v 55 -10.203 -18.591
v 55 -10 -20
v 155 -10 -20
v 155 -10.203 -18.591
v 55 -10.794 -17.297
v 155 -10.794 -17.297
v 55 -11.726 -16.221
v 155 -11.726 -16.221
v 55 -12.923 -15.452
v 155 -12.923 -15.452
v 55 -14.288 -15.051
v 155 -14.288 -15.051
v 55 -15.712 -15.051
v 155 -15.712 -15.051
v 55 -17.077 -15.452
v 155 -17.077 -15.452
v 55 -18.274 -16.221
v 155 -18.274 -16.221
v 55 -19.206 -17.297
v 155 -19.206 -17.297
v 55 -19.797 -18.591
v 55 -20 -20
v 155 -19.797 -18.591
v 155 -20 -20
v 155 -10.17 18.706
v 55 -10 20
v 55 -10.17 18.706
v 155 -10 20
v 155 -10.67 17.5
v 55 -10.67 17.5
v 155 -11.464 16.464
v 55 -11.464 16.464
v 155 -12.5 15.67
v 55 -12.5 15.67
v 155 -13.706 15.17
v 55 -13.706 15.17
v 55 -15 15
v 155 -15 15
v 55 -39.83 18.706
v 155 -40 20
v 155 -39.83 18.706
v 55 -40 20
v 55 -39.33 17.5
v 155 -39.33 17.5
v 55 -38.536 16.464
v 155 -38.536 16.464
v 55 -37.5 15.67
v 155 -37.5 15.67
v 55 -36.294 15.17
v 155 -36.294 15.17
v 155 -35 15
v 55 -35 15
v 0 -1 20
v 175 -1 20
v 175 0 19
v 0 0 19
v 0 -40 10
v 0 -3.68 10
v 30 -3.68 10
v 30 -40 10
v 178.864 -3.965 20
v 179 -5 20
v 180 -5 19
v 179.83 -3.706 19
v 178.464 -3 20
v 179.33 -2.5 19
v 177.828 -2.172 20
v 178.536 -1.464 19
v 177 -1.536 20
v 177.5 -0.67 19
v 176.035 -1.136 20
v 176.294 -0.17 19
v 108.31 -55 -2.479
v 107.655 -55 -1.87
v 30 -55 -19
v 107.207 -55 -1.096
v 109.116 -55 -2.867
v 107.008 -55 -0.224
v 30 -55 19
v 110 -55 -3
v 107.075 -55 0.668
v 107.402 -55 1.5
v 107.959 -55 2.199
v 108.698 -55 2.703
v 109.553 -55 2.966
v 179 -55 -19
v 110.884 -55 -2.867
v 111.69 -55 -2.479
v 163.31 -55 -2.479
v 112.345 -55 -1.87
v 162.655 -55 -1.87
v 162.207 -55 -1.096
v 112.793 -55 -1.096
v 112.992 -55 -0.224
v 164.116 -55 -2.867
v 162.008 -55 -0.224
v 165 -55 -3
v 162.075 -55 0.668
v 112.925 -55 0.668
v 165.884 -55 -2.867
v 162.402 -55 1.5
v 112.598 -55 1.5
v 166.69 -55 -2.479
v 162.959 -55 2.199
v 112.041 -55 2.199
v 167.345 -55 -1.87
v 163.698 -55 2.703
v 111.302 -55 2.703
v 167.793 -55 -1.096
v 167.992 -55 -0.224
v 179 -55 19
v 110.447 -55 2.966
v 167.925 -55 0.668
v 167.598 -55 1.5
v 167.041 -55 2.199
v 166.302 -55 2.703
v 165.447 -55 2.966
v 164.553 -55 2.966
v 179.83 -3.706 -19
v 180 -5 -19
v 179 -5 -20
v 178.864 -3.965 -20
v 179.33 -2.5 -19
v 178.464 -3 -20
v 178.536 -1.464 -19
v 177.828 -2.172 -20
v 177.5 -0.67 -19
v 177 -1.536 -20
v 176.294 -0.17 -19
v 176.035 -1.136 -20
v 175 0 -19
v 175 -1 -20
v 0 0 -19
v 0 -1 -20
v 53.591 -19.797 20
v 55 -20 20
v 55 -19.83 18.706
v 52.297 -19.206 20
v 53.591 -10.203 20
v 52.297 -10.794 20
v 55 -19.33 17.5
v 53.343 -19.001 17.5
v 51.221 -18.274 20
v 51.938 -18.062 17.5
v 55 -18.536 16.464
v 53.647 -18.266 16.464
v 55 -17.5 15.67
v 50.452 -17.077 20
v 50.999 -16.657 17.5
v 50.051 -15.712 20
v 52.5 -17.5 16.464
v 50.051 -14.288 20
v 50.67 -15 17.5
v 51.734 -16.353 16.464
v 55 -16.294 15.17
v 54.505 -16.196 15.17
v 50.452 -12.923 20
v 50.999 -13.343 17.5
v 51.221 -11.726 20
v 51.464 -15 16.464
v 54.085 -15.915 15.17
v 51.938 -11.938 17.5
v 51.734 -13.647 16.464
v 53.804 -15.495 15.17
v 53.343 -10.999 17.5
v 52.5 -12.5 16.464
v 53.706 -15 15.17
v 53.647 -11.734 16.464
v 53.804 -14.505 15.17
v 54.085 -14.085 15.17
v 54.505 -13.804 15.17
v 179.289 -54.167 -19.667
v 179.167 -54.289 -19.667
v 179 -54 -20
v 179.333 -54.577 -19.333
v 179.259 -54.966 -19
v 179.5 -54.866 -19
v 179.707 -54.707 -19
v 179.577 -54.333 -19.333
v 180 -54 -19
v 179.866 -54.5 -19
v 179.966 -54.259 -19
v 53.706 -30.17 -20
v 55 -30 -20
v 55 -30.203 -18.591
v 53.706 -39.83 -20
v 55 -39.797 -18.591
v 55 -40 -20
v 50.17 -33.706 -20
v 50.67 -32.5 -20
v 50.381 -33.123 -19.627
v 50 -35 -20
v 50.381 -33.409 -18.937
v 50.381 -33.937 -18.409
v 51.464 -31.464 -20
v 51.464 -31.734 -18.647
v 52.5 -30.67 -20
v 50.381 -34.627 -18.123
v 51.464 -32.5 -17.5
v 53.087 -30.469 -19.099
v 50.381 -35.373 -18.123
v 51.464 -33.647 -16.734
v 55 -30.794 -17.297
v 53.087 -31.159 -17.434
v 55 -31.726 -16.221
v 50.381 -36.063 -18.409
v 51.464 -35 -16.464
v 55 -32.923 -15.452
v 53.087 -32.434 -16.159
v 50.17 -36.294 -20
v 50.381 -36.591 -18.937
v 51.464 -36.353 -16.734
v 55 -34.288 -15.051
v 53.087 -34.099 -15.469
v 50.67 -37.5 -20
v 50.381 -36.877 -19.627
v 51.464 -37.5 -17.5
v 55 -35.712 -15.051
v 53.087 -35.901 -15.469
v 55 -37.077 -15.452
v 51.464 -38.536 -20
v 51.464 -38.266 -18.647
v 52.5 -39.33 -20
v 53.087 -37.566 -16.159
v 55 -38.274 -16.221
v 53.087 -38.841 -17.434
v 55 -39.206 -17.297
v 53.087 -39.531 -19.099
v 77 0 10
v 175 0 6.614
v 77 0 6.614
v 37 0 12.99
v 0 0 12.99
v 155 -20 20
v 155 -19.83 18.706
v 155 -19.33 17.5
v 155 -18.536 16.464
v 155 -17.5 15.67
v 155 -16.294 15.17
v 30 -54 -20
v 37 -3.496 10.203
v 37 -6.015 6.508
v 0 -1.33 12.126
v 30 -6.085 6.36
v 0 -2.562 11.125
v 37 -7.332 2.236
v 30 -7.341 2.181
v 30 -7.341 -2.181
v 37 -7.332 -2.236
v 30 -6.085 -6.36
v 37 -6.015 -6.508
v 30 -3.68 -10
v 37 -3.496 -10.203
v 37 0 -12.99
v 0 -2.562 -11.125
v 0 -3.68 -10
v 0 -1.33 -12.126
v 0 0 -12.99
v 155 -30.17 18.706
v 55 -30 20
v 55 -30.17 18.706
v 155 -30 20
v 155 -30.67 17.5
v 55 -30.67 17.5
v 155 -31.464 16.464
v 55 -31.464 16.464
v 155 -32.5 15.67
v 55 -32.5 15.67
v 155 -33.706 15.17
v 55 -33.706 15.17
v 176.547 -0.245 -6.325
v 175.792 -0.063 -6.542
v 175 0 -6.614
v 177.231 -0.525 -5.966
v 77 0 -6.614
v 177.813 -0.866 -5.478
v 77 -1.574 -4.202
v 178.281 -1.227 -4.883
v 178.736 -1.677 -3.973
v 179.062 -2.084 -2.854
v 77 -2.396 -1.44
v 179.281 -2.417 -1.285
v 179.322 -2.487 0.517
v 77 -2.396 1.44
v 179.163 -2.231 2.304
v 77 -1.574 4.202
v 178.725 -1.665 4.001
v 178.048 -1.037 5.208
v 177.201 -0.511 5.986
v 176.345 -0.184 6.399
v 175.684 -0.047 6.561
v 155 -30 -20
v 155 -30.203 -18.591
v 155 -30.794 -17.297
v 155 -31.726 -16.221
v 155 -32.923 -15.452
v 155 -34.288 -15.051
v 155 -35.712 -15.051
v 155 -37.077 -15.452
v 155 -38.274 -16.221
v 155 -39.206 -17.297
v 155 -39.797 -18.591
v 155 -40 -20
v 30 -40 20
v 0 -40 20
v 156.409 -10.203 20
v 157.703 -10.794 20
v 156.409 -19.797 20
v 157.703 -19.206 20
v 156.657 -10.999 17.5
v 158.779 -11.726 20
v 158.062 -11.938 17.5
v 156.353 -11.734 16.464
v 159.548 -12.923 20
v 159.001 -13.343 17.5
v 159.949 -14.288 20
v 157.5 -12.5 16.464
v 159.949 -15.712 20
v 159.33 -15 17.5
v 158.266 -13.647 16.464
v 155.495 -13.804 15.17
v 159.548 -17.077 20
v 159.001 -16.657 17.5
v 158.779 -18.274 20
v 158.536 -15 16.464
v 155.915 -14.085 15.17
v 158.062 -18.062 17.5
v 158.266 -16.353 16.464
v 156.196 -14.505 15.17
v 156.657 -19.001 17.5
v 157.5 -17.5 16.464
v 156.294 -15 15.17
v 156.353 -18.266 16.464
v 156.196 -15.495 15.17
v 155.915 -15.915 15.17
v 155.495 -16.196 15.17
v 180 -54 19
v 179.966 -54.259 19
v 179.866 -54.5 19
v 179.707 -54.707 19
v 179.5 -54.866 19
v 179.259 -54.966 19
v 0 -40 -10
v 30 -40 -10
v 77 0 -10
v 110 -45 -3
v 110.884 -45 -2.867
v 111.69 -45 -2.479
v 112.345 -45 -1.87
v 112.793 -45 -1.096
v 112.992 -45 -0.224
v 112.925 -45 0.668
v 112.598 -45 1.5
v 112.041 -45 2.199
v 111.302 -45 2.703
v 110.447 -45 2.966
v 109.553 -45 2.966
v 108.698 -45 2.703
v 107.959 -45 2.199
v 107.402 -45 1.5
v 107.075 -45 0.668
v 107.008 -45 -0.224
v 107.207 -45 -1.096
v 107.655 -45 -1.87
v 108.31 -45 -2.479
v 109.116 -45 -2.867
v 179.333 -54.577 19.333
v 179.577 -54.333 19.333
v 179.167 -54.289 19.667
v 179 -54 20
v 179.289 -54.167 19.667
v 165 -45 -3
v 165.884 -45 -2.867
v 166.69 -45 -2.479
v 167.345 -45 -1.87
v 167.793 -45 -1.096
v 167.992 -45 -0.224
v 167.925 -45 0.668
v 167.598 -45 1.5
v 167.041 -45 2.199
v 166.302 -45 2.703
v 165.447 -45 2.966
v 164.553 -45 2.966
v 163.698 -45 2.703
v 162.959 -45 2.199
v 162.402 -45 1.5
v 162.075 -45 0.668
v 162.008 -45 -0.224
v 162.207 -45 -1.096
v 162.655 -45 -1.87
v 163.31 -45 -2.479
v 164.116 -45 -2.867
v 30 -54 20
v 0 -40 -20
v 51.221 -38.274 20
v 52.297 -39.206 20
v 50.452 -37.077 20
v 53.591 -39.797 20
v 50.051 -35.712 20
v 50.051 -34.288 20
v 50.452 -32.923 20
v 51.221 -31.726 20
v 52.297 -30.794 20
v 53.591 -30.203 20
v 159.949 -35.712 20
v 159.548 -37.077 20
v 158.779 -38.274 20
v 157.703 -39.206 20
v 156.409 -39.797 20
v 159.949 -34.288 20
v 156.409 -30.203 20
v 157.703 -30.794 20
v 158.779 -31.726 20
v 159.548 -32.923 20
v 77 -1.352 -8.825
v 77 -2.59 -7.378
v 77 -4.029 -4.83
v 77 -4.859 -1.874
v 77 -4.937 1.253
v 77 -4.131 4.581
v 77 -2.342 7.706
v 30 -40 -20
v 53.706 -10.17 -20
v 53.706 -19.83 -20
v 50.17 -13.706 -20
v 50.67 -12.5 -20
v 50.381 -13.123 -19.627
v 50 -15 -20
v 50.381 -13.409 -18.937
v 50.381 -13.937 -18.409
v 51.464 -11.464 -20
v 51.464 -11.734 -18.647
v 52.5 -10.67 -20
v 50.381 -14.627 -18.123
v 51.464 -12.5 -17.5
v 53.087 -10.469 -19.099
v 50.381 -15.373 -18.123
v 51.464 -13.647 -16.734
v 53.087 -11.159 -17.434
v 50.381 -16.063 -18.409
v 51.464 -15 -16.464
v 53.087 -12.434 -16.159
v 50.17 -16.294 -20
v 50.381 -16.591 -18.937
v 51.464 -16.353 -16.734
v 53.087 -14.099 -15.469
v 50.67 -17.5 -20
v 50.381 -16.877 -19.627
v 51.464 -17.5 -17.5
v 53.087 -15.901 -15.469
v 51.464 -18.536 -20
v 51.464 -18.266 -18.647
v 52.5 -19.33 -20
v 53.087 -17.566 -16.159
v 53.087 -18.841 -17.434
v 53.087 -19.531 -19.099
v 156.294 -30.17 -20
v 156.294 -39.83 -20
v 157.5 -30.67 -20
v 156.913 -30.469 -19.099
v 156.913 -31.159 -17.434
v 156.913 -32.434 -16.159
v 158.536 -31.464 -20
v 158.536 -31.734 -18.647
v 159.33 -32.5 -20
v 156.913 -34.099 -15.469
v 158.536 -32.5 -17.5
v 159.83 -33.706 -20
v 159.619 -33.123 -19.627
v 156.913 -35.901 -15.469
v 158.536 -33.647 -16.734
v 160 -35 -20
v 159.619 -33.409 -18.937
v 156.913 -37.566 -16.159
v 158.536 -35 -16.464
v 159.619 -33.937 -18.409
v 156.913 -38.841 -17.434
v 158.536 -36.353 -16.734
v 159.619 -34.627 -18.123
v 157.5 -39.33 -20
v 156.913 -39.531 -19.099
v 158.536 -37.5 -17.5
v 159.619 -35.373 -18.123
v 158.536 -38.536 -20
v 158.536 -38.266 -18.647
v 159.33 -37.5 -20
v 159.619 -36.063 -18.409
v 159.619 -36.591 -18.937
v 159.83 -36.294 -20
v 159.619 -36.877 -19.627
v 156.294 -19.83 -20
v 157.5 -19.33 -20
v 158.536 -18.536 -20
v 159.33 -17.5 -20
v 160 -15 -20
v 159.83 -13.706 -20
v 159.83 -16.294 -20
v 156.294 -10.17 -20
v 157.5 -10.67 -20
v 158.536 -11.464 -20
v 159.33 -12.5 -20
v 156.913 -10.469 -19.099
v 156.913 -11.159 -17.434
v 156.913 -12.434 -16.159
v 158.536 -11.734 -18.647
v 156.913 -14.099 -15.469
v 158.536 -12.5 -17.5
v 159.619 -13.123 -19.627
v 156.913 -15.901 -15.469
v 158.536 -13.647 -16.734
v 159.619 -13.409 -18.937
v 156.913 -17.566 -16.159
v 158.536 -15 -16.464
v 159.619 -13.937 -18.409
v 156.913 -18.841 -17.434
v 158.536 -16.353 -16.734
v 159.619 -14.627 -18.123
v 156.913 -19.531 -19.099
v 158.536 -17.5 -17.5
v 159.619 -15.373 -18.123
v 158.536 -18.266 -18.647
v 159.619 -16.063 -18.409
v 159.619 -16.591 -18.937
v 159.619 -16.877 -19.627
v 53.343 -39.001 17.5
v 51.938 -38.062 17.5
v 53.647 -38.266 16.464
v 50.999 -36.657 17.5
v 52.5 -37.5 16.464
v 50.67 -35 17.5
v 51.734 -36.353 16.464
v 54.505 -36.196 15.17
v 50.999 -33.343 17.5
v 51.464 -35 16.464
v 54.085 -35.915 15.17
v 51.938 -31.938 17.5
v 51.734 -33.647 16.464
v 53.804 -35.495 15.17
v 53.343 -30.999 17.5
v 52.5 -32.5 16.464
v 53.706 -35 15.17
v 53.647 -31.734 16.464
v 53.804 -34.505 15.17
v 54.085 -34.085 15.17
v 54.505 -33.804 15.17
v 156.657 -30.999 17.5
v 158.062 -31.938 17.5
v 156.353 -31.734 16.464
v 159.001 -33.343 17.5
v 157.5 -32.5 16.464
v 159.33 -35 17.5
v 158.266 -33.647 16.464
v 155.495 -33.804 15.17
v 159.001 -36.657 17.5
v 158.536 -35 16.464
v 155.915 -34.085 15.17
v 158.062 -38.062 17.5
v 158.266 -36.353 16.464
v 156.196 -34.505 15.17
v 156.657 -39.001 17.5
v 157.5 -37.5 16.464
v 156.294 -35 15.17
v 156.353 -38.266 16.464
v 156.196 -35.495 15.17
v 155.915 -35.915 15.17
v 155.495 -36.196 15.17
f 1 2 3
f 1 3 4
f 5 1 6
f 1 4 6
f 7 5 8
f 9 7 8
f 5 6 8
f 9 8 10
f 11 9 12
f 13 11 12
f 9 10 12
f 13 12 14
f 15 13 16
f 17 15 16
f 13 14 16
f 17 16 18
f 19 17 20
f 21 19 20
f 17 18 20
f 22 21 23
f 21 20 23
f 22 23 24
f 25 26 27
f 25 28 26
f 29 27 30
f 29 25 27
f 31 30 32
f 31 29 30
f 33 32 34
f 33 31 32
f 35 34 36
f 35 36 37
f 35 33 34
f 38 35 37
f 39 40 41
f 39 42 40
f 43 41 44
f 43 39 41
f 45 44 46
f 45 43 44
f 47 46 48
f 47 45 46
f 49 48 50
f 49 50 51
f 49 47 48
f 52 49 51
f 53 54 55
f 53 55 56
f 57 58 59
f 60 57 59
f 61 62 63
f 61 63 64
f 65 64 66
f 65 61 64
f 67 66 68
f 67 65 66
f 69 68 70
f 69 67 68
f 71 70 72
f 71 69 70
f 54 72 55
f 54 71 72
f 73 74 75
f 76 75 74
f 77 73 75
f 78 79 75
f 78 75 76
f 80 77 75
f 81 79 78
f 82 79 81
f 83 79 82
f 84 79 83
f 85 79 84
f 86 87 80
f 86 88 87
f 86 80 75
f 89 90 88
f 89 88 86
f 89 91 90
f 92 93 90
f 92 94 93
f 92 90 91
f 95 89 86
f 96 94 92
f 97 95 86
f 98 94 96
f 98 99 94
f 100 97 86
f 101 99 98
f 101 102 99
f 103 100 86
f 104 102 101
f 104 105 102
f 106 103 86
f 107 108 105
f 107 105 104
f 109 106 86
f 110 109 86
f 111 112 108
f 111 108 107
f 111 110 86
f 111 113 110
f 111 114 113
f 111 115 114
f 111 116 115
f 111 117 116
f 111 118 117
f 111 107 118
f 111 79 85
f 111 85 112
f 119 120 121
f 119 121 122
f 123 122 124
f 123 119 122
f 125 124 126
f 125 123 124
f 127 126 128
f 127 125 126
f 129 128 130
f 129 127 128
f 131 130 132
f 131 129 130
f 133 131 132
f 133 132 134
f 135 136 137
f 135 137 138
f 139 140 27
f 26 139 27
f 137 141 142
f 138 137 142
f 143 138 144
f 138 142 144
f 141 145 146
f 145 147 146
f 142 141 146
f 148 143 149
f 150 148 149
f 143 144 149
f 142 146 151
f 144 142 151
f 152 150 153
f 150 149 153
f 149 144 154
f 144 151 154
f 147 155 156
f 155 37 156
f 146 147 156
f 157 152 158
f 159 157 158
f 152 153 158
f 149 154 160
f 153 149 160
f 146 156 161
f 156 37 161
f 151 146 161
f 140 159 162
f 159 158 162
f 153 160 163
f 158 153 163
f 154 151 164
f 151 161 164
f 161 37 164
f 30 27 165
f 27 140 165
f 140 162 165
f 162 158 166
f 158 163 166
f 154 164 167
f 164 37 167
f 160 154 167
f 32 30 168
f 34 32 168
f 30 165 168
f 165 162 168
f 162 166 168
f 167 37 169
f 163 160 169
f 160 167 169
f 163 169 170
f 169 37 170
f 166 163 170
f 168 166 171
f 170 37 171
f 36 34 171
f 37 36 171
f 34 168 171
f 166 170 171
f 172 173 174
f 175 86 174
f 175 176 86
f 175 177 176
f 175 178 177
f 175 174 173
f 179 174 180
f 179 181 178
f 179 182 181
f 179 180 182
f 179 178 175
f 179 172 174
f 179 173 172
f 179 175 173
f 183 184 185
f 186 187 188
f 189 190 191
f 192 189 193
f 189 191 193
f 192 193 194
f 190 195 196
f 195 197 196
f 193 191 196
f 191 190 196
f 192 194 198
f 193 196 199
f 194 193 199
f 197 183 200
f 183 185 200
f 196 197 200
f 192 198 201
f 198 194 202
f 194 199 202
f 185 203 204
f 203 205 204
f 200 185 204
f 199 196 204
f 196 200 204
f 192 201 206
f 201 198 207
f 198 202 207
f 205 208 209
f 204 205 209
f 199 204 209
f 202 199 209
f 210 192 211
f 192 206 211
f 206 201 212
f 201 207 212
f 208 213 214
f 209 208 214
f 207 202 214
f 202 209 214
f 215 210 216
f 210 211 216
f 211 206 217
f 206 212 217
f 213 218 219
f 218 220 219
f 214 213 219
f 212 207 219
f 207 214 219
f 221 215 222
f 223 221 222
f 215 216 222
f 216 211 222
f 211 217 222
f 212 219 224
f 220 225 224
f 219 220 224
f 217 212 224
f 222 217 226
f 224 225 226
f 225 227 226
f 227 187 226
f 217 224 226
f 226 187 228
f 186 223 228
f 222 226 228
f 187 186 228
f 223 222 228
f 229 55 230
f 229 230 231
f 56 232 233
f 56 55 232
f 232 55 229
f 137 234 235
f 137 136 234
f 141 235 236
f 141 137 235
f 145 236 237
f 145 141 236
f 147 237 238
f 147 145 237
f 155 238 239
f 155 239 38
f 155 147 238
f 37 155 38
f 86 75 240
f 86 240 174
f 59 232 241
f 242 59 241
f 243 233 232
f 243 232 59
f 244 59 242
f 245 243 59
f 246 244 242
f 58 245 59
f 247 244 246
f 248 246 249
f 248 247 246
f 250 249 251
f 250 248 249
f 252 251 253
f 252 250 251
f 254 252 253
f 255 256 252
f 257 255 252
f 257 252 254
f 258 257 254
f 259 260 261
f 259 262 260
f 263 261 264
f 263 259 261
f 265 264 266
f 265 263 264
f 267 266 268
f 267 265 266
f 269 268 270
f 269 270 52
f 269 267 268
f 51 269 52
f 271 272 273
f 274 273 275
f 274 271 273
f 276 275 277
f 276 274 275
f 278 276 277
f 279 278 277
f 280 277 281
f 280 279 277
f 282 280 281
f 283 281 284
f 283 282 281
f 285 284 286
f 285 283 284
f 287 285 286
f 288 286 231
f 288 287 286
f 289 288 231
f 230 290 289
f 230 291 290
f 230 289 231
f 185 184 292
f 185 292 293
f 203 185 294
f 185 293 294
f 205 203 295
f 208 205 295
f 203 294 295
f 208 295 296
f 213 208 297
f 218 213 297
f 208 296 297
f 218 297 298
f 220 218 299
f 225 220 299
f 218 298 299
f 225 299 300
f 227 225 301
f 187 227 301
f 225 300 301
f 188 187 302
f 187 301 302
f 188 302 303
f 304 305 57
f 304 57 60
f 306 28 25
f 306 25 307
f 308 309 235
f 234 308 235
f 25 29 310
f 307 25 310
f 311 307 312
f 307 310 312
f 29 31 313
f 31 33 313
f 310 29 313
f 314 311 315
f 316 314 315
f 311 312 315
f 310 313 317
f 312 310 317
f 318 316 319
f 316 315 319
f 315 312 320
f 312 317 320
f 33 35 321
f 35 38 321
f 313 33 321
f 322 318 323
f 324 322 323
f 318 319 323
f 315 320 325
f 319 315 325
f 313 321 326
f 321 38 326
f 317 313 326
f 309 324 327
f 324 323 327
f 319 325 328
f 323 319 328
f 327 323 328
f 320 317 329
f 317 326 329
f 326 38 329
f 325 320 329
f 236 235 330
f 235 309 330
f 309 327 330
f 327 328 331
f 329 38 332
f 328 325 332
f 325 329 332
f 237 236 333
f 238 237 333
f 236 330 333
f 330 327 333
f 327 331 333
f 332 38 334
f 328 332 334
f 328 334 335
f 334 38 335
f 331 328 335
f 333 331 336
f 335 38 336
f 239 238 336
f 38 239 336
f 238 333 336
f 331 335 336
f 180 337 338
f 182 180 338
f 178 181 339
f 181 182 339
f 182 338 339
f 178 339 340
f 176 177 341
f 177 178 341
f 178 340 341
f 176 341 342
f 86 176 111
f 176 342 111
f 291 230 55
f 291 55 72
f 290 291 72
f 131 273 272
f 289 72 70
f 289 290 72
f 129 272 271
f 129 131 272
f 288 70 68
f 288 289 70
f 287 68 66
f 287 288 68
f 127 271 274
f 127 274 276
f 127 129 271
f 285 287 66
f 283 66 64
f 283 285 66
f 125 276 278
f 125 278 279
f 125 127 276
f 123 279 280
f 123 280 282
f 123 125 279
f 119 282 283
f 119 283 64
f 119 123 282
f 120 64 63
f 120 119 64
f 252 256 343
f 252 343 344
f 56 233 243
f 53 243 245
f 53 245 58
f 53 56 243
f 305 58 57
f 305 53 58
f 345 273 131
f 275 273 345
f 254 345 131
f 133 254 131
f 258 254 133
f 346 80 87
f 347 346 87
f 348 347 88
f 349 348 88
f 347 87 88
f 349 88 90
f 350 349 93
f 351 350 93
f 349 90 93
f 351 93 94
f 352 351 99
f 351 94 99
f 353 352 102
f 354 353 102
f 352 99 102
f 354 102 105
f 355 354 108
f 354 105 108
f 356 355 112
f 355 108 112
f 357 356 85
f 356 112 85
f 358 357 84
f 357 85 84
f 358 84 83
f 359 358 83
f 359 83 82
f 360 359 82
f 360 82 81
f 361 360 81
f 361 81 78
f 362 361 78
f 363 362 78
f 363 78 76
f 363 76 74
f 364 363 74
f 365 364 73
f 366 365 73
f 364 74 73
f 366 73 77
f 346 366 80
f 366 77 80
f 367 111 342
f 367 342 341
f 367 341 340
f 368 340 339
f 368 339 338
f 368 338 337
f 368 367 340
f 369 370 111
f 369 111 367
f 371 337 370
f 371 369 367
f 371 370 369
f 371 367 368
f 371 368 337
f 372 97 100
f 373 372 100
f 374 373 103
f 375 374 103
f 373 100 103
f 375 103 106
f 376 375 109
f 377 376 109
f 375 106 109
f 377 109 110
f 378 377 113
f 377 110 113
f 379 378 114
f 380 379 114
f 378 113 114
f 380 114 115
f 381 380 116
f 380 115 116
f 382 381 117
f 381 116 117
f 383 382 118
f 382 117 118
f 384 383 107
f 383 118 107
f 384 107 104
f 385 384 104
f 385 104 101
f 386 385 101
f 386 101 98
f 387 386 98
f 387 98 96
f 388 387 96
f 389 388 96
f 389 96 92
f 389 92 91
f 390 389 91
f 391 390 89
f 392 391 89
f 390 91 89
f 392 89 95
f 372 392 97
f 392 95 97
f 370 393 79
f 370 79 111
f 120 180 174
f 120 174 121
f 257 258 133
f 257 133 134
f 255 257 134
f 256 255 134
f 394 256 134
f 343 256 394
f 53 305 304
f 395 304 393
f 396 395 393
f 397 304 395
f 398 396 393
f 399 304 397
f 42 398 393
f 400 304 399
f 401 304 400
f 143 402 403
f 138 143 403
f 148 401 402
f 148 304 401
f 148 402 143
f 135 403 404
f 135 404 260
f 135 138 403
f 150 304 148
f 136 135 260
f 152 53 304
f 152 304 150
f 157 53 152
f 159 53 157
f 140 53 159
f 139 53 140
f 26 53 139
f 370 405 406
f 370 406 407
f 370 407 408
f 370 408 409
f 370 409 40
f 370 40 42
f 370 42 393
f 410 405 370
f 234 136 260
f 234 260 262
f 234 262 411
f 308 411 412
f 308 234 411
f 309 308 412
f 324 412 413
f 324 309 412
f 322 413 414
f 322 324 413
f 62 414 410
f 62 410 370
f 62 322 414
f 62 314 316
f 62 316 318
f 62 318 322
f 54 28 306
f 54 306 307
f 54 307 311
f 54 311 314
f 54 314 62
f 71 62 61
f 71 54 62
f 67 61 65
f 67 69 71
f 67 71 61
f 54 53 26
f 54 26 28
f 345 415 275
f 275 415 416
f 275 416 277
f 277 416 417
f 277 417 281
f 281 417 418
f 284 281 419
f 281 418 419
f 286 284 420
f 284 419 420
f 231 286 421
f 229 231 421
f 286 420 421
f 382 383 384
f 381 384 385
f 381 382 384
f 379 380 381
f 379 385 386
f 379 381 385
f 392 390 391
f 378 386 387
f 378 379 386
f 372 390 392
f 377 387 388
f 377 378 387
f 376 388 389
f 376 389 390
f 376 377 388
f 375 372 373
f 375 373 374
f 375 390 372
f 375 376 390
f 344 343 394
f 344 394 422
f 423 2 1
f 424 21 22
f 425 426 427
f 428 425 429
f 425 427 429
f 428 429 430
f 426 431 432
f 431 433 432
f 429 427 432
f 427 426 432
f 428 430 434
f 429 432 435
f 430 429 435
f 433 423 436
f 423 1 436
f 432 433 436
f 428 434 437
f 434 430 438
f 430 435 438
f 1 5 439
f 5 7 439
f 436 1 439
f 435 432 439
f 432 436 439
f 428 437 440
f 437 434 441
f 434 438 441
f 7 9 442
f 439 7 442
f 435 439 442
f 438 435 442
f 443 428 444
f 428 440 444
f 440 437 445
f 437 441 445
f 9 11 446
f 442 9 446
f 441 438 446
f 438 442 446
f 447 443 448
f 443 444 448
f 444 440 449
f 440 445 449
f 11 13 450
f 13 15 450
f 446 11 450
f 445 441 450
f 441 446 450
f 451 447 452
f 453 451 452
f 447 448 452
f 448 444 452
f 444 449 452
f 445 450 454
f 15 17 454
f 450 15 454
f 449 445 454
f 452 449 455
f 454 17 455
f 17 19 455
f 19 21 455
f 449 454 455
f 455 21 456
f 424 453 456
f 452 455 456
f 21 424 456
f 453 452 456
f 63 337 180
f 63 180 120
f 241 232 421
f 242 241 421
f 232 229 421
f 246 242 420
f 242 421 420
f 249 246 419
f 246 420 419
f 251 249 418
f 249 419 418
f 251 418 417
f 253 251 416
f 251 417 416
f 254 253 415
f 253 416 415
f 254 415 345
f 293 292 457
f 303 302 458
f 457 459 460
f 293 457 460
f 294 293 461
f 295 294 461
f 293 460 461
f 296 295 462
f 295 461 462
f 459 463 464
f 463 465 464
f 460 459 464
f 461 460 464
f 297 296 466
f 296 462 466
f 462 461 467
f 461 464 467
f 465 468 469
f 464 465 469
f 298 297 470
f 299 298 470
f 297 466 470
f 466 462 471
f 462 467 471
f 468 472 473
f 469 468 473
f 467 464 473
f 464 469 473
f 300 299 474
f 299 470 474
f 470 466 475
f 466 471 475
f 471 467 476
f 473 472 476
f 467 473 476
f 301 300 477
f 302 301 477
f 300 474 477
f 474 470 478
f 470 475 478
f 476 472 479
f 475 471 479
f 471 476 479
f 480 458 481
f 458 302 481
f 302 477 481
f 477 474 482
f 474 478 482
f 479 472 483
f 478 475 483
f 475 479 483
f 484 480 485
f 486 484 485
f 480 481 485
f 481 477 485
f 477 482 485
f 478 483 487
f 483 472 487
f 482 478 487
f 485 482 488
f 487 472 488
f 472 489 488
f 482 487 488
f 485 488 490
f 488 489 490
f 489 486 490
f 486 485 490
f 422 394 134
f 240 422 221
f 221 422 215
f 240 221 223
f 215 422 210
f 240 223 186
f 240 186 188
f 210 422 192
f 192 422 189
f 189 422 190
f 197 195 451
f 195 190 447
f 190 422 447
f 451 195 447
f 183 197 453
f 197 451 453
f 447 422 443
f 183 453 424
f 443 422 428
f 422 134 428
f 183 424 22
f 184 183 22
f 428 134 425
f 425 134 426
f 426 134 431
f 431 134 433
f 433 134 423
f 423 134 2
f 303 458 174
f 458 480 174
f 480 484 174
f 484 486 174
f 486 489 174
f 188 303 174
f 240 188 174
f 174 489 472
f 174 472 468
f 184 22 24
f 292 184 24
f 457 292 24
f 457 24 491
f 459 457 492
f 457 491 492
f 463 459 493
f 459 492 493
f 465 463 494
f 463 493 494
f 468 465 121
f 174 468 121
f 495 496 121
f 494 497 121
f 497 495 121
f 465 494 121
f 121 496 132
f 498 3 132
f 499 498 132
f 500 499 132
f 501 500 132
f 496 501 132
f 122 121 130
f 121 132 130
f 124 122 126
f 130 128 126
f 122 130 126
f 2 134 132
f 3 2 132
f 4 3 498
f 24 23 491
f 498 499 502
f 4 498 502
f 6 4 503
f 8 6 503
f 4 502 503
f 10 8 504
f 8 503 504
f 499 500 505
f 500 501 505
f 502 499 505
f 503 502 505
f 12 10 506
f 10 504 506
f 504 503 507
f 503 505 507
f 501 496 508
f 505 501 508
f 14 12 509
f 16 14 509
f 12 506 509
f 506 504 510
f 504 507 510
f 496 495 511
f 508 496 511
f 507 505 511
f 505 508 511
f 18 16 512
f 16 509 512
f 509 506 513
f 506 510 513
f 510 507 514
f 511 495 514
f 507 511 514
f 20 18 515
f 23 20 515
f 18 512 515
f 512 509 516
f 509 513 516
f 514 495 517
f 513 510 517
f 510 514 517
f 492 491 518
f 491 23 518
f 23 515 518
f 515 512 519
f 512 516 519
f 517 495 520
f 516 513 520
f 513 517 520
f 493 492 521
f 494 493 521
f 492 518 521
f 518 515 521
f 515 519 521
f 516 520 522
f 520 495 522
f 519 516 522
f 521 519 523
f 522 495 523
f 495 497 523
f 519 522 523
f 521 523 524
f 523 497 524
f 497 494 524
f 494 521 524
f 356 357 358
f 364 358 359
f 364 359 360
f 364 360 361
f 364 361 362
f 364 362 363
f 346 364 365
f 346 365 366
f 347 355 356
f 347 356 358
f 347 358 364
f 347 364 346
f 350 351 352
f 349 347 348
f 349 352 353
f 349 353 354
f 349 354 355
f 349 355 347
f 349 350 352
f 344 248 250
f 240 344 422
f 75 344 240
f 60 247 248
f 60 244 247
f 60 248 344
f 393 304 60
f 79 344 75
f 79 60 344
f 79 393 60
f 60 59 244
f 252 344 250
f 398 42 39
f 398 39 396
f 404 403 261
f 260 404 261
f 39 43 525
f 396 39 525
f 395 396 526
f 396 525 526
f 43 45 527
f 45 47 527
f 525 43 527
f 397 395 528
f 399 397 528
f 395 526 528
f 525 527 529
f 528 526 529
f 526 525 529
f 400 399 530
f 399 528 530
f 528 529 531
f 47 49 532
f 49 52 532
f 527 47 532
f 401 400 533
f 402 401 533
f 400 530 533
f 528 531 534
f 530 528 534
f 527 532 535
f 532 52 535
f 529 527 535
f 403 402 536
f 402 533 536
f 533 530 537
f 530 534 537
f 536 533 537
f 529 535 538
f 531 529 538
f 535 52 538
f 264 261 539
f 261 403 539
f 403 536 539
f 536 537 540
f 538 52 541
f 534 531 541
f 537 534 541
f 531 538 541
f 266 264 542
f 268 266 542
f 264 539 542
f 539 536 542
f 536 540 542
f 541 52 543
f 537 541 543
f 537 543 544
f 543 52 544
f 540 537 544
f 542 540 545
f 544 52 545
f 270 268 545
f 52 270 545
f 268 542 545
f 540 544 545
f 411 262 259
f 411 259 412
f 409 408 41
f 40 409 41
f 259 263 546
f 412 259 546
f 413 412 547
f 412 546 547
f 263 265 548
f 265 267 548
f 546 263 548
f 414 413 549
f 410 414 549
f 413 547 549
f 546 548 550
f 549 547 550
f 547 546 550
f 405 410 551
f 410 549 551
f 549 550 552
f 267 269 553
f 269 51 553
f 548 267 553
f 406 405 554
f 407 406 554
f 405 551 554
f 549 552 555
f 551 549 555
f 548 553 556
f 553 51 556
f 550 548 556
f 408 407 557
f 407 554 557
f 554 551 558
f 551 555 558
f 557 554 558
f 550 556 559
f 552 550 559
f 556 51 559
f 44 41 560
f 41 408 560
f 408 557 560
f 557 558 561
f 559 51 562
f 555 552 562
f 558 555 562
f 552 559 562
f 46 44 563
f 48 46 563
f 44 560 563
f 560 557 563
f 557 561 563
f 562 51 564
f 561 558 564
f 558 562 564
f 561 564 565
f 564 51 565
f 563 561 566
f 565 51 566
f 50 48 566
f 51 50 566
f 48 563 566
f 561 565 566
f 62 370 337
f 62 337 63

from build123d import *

# Parameters (mm, degrees)
EXTRUDE_1_DEPTH                = 20
SKETCH_2_W                     = 30
SKETCH_2_H                     = 40
CUT_EXTRUDE_1_DEPTH            = 10
FILLET_1_R                     = 5
FILLET_2_R                     = 1
CUT_EXTRUDE_2_DEPTH            = 37
CUT_EXTRUDE_3_DEPTH            = 190.274932307
CHAMFER_1_SIZE                 = 1
CUT_EXTRUDE_4_DEPTH            = 5
FILLET_3_R                     = 5
PATTERN_LINEAR_7_COUNT         = 2
PATTERN_LINEAR_7_PITCH         = 20
FILLET_3_OF_PATTERN_LINEAR_7_R = 5
SKETCH_7_R                     = 3
CUT_EXTRUDE_5_DEPTH            = 10


# Read off the part's stored shape, not the designer's step: 대칭 복사4
with BuildPart() as part:
    # 스케치1 → 보스-돌출1 (new, symmetric)
    with BuildSketch(Plane.XY):
        Polygon((0, -40), (30, -40), (30, -55), (180, -55), (180, 0), (0, 0), align=None)
    extrude(amount=EXTRUDE_1_DEPTH, both=True)

    # 스케치2 → 컷-돌출1 (cut, symmetric)
    with BuildSketch(Plane.XY):
        with Locations((15, -20)):
            Rectangle(SKETCH_2_W, SKETCH_2_H)
    extrude(amount=CUT_EXTRUDE_1_DEPTH, both=True, mode=Mode.SUBTRACT)

    # 필렛1
    fillet_1_edges = [part.edges().sort_by_distance(p)[0] for p in [
        (180, 0, 0),
    ]]
    fillet(fillet_1_edges, radius=FILLET_1_R)

    # 필렛2
    fillet_2_edges = [part.edges().sort_by_distance(p)[0] for p in [
        (180, -55, 0),
    ]]
    fillet(fillet_2_edges, radius=FILLET_2_R)

    # 스케치3 → 컷-돌출2 (cut)
    with BuildSketch(Plane.ZY):
        with BuildLine():
            Line((-12.990381057, 0), (12.990381057, 0))
            ThreePointArc((12.990381057, 0), (0, -7.5), (-12.990381057, 0))
        make_face()
    extrude(amount=-CUT_EXTRUDE_2_DEPTH, mode=Mode.SUBTRACT)

    # 스케치4 → 컷-돌출3 (cut, through all)
    with BuildSketch(Plane(origin=(180, 0, 0), x_dir=(0, 0, -1), z_dir=(1, 0, 0))):
        with BuildLine():
            Line((-6.614378278, 0), (6.614378278, 0))
            ThreePointArc((6.614378278, 0), (0, -2.5), (-6.614378278, 0))
        make_face()
    extrude(amount=-CUT_EXTRUDE_3_DEPTH, mode=Mode.SUBTRACT)

    # 스케치6 for 컷-로프트1 → 컷-로프트1 section 0
    with BuildSketch(Plane.ZY.offset(-37)):
        with BuildLine():
            Line((-12.990381057, 0), (12.990381057, 0))
            # circular arc as an exact rational Bezier (weights 1, cos(half-angle), 1)
            Bezier((12.990381057, 0), (0, -22.5), (-12.990381057, 0), weights=[1, 0.5, 1])
        make_face()
    # 스케치5 for 컷-로프트1 → 컷-로프트1 section 1
    with BuildSketch(Plane.ZY.offset(-77)):
        with BuildLine():
            Line((-10, 0), (10, 0))
            Bezier((10, 0), (0, -13.333333333), (-10, 0), weights=[1, 0.6, 1])
        make_face()
    loft(mode=Mode.SUBTRACT)

    # 모따기1
    chamfer_1_edges = [part.edges().sort_by_distance(p)[0] for p in [
        (104.5, -55, 20),
        (87.5, 0, 20),
        (180, -29.5, -20),
        (178.535533906, -1.464466094, -20),
        (180, -29.5, 20),
        (178.535533906, -1.464466094, 20),
        (179.707106781, -54.707106781, -20),
        (179.707106781, -54.707106781, 20),
        (87.5, 0, -20),
        (104.5, -55, -20),
    ]]
    chamfer(chamfer_1_edges, length=CHAMFER_1_SIZE)

    # 스케치8 → 컷-돌출4 (cut)
    with BuildSketch(Plane.XY.offset(20)):
        with BuildLine():
            Line((55, -10), (155, -10))
            ThreePointArc((155, -10), (160, -15), (155, -20))
            Line((155, -20), (55, -20))
            ThreePointArc((55, -20), (50, -15), (55, -10))
        make_face()
    cut_extrude_4 = extrude(amount=-CUT_EXTRUDE_4_DEPTH, mode=Mode.SUBTRACT)

    # 필렛3
    fillet_3_edges = [part.edges().sort_by_distance(p)[0] for p in [
        (105, -20, 15),
        (105, -10, 15),
        (50, -15, 15),
        (160, -15, 15),
    ]]
    fillet(fillet_3_edges, radius=FILLET_3_R - 0.0001)  # a hair under: the kernel refuses the full size

    # 선형 패턴7: 컷-돌출4 ×2
    with Locations(*[(0, -i * PATTERN_LINEAR_7_PITCH, 0) for i in range(1, PATTERN_LINEAR_7_COUNT)]):
        add(cut_extrude_4, mode=Mode.SUBTRACT)

    # 필렛3 of 선형 패턴7
    fillet_3_of_pattern_linear_7_edges = [part.edges().sort_by_distance(p)[0] for p in [
        (105, -40, 15),
        (105, -30, 15),
        (50, -35, 15),
        (160, -35, 15),
    ]]
    fillet(fillet_3_of_pattern_linear_7_edges, radius=FILLET_3_OF_PATTERN_LINEAR_7_R - 0.0001)  # a hair under: the kernel refuses the full size

    # 대칭 복사4 outline → 대칭 복사4 (revolve, cut)
    with BuildSketch(Plane(origin=(0, -15, -20), x_dir=(0, 1, 0), z_dir=(0, 0, -1))):
        with BuildLine():
            ThreePointArc((0, 50), (3.535533906, 51.464466094), (5, 55))
            Line((5, 55), (5, 155))
            ThreePointArc((5, 155), (3.535533906, 158.535533906), (0, 160))
            Line((0, 160), (0, 50))
        make_face()
    revolve(axis=Axis((0, -15, -20), (1, 0, 0)), mode=Mode.SUBTRACT)

    # Mirror 4 2 outline → Mirror 4 2 (revolve, cut)
    with BuildSketch(Plane(origin=(0, -35, -20), x_dir=(0, 1, 0), z_dir=(0, 0, -1))):
        with BuildLine():
            ThreePointArc((0, 50), (3.535533906, 51.464466094), (5, 55))
            Line((5, 55), (5, 155))
            ThreePointArc((5, 155), (3.535533906, 158.535533906), (0, 160))
            Line((0, 160), (0, 50))
        make_face()
    revolve(axis=Axis((0, -35, -20), (1, 0, 0)), mode=Mode.SUBTRACT)

    # 스케치7 → 컷-돌출5 (cut)
    with BuildSketch(Plane.XZ.offset(55)):
        with Locations(Location((165, 0, 0), (0, 0, 270))):
            Circle(SKETCH_7_R)
        with Locations(Location((110, 0, 0), (0, 0, 270))):
            Circle(SKETCH_7_R)
    extrude(amount=-CUT_EXTRUDE_5_DEPTH, mode=Mode.SUBTRACT)


solid = part.part
